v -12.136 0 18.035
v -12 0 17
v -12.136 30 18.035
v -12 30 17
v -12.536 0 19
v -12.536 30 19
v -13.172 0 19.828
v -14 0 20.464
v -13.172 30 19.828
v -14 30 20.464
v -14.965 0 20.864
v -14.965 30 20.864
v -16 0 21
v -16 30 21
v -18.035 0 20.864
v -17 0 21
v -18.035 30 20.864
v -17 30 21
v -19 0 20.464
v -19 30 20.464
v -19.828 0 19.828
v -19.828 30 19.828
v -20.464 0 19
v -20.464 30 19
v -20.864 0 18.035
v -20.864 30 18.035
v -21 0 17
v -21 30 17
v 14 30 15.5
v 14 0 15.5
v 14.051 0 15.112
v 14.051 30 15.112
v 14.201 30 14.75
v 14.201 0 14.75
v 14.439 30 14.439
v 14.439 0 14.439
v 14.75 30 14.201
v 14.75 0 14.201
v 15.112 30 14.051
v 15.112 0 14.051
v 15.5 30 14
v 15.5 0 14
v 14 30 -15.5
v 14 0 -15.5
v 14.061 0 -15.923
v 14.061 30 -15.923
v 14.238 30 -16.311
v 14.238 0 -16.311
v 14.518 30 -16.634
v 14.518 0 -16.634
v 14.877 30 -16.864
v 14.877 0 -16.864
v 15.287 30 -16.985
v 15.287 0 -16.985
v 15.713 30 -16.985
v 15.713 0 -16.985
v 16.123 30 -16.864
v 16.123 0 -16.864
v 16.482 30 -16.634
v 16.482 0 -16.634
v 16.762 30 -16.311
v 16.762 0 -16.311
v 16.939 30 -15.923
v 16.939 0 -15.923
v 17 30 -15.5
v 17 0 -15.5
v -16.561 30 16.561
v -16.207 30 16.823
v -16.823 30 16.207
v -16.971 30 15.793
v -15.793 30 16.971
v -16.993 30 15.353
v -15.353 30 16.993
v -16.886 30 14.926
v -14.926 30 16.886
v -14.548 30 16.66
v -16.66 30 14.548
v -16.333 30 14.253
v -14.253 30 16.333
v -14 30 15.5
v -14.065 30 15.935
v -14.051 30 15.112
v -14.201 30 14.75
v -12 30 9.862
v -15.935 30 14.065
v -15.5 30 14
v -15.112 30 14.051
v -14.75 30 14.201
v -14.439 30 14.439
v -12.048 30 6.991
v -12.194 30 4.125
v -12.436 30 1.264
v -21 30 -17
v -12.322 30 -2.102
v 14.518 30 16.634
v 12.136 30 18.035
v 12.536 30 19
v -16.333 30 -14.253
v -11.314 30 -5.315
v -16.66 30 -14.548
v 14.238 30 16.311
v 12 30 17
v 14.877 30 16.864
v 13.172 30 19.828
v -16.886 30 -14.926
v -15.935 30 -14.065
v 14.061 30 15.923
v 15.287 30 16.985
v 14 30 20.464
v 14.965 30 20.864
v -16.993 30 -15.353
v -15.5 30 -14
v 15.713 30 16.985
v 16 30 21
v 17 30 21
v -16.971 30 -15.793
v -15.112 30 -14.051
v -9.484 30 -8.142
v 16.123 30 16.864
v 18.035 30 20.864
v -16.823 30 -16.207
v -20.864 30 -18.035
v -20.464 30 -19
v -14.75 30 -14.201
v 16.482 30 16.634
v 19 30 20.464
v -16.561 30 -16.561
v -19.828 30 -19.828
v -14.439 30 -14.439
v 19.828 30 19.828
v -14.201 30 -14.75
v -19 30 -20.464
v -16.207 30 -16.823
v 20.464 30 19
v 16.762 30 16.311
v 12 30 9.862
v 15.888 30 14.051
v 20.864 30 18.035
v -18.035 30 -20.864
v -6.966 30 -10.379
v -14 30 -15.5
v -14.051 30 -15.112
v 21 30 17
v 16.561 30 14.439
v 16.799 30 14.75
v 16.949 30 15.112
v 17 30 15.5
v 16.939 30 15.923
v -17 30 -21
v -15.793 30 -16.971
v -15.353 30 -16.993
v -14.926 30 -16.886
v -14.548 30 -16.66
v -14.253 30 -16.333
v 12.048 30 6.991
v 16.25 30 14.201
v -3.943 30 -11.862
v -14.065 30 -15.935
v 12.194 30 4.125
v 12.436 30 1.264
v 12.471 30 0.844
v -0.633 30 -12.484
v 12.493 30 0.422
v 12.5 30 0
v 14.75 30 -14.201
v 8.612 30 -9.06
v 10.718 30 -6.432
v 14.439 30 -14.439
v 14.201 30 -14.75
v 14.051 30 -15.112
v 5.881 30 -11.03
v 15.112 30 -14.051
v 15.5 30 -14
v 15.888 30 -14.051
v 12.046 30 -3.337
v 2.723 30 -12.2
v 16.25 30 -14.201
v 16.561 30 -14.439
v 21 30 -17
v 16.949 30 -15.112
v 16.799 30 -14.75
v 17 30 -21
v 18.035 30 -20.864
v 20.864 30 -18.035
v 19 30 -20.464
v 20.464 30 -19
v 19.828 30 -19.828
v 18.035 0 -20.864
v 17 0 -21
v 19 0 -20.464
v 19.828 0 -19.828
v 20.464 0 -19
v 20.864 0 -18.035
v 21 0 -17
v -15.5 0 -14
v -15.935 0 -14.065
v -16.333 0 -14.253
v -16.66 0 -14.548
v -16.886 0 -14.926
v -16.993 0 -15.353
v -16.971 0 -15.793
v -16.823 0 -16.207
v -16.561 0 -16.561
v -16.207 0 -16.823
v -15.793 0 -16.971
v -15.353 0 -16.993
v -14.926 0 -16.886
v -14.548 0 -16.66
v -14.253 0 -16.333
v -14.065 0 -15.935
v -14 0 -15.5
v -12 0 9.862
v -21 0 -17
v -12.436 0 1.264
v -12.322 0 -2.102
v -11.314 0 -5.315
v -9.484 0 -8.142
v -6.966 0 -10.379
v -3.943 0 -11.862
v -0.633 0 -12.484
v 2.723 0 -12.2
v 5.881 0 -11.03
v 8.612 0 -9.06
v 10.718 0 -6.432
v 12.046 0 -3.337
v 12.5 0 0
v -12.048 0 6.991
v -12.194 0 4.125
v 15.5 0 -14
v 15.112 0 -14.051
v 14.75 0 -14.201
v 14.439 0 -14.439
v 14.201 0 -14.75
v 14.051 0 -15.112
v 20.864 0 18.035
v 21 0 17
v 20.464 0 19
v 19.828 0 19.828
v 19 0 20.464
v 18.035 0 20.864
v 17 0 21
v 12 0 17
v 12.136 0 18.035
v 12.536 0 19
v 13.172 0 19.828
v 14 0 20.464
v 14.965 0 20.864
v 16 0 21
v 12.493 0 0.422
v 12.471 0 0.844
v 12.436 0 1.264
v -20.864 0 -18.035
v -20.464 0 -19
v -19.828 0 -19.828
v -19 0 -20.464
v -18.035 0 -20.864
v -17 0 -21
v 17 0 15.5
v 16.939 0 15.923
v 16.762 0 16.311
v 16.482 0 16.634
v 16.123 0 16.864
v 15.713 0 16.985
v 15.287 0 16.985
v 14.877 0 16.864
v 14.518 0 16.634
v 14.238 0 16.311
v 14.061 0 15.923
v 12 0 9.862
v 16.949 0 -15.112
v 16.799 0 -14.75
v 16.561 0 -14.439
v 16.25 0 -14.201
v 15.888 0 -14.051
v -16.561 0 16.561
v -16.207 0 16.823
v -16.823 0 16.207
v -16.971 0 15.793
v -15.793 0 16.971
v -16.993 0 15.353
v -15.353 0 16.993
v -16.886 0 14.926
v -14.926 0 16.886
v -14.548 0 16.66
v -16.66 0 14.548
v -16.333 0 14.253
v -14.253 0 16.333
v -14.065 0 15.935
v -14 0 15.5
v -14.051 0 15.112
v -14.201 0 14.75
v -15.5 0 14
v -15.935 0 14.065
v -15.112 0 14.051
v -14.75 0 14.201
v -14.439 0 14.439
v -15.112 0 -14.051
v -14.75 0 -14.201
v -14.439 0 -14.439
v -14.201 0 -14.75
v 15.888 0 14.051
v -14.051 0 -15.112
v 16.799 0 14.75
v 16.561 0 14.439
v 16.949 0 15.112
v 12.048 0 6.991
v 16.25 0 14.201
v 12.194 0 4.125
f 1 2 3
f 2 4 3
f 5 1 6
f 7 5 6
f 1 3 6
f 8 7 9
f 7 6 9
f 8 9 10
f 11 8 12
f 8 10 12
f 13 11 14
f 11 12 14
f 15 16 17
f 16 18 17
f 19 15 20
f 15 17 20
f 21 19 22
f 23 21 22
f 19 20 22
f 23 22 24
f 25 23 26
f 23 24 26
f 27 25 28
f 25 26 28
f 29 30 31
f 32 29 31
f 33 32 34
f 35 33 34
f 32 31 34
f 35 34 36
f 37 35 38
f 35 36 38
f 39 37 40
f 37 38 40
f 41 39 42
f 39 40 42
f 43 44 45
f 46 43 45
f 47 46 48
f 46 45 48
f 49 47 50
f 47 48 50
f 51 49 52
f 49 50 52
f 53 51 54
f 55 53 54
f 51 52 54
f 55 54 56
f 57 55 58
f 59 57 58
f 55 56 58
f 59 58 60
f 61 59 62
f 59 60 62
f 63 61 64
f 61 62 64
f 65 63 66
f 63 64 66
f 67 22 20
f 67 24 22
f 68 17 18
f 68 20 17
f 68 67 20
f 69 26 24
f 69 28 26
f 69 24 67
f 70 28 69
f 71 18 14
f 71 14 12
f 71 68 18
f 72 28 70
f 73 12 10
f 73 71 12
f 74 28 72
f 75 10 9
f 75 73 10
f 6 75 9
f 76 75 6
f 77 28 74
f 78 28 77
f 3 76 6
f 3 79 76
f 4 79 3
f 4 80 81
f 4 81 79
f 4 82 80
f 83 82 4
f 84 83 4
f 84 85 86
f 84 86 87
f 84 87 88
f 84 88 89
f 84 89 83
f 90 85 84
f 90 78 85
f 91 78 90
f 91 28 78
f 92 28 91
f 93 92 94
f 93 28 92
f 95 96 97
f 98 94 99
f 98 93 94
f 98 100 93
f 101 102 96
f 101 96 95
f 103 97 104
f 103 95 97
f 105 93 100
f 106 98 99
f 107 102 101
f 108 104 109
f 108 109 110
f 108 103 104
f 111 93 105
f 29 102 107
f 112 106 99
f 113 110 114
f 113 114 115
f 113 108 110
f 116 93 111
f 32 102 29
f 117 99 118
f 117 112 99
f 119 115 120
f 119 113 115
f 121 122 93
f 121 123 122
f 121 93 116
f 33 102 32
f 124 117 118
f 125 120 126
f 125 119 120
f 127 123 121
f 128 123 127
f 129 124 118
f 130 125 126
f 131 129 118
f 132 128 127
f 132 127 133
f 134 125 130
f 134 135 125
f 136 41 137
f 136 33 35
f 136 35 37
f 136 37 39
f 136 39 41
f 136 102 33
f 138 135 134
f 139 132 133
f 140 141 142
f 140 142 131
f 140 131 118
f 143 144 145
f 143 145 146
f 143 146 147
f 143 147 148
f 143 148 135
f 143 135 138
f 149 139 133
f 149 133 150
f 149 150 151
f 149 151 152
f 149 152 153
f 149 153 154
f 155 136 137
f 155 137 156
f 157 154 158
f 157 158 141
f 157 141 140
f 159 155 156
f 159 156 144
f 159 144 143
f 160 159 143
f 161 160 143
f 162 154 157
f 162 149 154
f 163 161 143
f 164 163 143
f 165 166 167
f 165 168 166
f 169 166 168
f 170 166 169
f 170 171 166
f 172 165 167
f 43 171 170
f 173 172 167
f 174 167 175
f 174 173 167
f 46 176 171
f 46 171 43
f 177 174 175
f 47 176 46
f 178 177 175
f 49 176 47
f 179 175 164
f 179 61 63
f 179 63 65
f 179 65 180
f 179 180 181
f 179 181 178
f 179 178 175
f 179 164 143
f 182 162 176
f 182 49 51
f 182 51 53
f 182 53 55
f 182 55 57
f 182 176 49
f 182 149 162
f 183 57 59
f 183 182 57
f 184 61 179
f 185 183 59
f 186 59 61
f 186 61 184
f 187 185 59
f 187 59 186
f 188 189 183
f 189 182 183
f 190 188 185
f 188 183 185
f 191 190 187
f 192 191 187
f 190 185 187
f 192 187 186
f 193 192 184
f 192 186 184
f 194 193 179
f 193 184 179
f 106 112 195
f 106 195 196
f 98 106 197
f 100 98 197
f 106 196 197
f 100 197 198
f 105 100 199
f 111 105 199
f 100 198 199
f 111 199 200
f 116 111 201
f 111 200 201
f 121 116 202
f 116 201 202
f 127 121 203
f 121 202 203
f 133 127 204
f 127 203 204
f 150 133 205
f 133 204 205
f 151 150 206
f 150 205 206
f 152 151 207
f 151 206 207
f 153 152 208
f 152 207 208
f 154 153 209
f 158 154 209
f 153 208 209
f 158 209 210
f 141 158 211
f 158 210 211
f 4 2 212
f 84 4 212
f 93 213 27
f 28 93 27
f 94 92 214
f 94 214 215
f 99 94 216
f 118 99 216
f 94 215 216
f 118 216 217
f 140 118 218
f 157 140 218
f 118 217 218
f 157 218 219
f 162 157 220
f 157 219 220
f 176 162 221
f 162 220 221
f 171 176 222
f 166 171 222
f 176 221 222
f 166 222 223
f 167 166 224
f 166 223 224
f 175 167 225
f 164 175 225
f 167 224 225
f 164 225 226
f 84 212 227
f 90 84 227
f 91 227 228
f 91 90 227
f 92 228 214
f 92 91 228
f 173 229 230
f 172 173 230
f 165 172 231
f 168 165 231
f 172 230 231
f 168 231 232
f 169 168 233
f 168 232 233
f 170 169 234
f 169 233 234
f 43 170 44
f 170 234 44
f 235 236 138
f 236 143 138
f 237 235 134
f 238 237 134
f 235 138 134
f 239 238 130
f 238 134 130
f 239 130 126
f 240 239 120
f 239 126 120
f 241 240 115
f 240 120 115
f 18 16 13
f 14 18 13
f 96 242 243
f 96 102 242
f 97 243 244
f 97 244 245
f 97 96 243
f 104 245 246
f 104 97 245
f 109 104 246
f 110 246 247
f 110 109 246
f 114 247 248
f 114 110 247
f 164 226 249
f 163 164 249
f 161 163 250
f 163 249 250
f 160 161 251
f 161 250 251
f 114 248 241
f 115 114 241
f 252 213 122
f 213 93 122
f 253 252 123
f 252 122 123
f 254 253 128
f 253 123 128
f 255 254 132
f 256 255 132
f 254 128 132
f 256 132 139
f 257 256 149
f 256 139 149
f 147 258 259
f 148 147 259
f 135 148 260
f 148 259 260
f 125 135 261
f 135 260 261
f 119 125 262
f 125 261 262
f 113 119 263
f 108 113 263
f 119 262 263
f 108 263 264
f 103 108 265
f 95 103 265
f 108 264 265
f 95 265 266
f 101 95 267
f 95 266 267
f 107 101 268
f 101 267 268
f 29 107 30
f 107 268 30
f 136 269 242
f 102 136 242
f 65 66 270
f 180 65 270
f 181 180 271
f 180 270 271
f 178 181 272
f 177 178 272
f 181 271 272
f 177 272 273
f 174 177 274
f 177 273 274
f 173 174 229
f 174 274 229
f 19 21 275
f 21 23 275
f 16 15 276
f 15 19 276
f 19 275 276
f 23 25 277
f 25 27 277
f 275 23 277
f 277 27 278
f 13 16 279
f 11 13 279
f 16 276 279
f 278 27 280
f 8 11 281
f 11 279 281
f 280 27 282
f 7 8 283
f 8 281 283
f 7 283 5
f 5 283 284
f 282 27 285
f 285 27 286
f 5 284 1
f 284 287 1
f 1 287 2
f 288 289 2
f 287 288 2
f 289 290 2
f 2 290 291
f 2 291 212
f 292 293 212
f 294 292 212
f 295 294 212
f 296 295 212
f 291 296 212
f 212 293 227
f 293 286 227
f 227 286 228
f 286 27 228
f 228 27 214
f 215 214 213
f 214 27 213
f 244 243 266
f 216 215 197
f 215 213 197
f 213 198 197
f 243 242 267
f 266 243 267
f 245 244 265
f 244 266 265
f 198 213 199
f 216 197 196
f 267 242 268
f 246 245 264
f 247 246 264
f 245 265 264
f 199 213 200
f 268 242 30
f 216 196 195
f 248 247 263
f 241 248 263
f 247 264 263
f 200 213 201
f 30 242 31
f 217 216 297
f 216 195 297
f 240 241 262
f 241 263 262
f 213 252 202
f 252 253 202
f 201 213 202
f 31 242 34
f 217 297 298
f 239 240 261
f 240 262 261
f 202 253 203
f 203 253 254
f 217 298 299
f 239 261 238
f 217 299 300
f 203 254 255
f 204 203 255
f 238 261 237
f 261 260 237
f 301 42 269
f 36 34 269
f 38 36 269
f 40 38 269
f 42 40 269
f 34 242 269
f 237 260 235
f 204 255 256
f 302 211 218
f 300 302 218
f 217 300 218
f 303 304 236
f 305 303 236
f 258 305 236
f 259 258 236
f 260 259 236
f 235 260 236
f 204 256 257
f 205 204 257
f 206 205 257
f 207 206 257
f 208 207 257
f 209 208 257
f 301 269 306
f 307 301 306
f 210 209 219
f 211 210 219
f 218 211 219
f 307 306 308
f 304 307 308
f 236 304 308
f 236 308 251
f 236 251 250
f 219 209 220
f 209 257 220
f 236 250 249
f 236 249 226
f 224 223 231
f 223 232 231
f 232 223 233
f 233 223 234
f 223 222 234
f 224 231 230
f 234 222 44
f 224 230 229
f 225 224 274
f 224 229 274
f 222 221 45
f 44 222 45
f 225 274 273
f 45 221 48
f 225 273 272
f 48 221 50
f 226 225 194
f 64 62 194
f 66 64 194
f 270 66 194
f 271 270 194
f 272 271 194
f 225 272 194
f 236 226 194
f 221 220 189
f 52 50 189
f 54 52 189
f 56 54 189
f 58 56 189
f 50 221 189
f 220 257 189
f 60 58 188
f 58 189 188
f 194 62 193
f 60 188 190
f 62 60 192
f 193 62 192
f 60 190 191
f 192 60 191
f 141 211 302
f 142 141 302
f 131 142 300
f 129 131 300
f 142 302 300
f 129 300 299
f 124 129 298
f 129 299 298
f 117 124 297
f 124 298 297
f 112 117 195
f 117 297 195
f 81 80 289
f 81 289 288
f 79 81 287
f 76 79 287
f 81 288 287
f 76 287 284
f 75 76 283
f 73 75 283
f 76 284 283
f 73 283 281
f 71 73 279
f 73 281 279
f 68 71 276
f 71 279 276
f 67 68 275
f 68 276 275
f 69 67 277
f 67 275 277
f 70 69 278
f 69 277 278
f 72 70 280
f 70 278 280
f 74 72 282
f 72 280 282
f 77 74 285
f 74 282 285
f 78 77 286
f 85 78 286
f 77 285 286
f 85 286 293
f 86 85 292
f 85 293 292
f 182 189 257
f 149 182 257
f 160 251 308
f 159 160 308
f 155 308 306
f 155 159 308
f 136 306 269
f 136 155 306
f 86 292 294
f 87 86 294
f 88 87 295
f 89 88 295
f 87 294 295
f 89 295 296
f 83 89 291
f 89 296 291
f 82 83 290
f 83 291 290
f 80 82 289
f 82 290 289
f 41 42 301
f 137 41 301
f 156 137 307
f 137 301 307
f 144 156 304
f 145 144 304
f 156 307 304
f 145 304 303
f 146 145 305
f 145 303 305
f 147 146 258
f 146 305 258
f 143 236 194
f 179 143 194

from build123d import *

# Parameters (mm, degrees)
BOSS_EXTRUDE1_DEPTH = 30
FILLET1_R           = 85
FILLET2_R           = 4


with BuildPart() as part:
    # Sketch1 → Boss-Extrude1 (new body)
    with BuildSketch(Plane(origin=(0, 0, 0), x_dir=(1, 0, 0), z_dir=(0, 1, 0))):
        with BuildLine():
            Line((-12, -21), (-12, -15.5))
            Line((-12, -15.5), (-14, -15.5))
            ThreePointArc((-14, -15.5), (-16.560660172, -16.560660172), (-15.5, -14))
            Line((-15.5, -14), (-15.5, 14))
            ThreePointArc((-15.5, 14), (-16.560660172, 16.560660172), (-14, 15.5))
            Line((-14, 15.5), (14, 15.5))
            ThreePointArc((14, 15.5), (15.5, 17), (17, 15.5))
            ThreePointArc((17, 15.5), (16.560660172, 14.439339828), (15.5, 14))
            Line((15.5, 14), (15.5, -14))
            ThreePointArc((15.5, -14), (16.560660172, -14.439339828), (17, -15.5))
            ThreePointArc((17, -15.5), (15.5, -17), (14, -15.5))
            Line((14, -15.5), (12, -15.5))
            Line((12, -15.5), (12, -21))
            Line((12, -21), (21, -21))
            Line((21, -21), (21, 21))
            Line((21, 21), (-21, 21))
            Line((-21, 21), (-21, -21))
            Line((-21, -21), (-12, -21))
        make_face()
        with BuildLine():
            Line((-12, -15.5), (-12, -3.5))
            ThreePointArc((-12, -3.5), (-1.767766953, 12.374368671), (12.5, 0))
            ThreePointArc((12.5, 0), (12.374368671, -1.767766953), (12, -3.5))
            Line((12, -3.5), (12, -15.5))
            Line((12, -15.5), (14, -15.5))
            ThreePointArc((14, -15.5), (14.439339828, -14.439339828), (15.5, -14))
            Line((15.5, -14), (15.5, 14))
            ThreePointArc((15.5, 14), (14.439339828, 14.439339828), (14, 15.5))
            Line((14, 15.5), (-14, 15.5))
            ThreePointArc((-14, 15.5), (-14.439339828, 14.439339828), (-15.5, 14))
            Line((-15.5, 14), (-15.5, -14))
            ThreePointArc((-15.5, -14), (-14.439339828, -14.439339828), (-14, -15.5))
            Line((-14, -15.5), (-12, -15.5))
        make_face()
    extrude(amount=BOSS_EXTRUDE1_DEPTH)

    # Fillet1
    fillet1_edges = [part.edges().sort_by_distance(p)[0] for p in [
        (-12, 15, 3.5),
        (12, 15, 3.5),
    ]]
    fillet(fillet1_edges, radius=FILLET1_R)

    # Fillet2
    fillet2_edges = [part.edges().sort_by_distance(p)[0] for p in [
        (-12, 15, 21),
        (-21, 15, 21),
        (-21, 15, -21),
        (21, 15, -21),
        (21, 15, 21),
        (12, 15, 21),
    ]]
    fillet(fillet2_edges, radius=FILLET2_R)


solid = part.part
